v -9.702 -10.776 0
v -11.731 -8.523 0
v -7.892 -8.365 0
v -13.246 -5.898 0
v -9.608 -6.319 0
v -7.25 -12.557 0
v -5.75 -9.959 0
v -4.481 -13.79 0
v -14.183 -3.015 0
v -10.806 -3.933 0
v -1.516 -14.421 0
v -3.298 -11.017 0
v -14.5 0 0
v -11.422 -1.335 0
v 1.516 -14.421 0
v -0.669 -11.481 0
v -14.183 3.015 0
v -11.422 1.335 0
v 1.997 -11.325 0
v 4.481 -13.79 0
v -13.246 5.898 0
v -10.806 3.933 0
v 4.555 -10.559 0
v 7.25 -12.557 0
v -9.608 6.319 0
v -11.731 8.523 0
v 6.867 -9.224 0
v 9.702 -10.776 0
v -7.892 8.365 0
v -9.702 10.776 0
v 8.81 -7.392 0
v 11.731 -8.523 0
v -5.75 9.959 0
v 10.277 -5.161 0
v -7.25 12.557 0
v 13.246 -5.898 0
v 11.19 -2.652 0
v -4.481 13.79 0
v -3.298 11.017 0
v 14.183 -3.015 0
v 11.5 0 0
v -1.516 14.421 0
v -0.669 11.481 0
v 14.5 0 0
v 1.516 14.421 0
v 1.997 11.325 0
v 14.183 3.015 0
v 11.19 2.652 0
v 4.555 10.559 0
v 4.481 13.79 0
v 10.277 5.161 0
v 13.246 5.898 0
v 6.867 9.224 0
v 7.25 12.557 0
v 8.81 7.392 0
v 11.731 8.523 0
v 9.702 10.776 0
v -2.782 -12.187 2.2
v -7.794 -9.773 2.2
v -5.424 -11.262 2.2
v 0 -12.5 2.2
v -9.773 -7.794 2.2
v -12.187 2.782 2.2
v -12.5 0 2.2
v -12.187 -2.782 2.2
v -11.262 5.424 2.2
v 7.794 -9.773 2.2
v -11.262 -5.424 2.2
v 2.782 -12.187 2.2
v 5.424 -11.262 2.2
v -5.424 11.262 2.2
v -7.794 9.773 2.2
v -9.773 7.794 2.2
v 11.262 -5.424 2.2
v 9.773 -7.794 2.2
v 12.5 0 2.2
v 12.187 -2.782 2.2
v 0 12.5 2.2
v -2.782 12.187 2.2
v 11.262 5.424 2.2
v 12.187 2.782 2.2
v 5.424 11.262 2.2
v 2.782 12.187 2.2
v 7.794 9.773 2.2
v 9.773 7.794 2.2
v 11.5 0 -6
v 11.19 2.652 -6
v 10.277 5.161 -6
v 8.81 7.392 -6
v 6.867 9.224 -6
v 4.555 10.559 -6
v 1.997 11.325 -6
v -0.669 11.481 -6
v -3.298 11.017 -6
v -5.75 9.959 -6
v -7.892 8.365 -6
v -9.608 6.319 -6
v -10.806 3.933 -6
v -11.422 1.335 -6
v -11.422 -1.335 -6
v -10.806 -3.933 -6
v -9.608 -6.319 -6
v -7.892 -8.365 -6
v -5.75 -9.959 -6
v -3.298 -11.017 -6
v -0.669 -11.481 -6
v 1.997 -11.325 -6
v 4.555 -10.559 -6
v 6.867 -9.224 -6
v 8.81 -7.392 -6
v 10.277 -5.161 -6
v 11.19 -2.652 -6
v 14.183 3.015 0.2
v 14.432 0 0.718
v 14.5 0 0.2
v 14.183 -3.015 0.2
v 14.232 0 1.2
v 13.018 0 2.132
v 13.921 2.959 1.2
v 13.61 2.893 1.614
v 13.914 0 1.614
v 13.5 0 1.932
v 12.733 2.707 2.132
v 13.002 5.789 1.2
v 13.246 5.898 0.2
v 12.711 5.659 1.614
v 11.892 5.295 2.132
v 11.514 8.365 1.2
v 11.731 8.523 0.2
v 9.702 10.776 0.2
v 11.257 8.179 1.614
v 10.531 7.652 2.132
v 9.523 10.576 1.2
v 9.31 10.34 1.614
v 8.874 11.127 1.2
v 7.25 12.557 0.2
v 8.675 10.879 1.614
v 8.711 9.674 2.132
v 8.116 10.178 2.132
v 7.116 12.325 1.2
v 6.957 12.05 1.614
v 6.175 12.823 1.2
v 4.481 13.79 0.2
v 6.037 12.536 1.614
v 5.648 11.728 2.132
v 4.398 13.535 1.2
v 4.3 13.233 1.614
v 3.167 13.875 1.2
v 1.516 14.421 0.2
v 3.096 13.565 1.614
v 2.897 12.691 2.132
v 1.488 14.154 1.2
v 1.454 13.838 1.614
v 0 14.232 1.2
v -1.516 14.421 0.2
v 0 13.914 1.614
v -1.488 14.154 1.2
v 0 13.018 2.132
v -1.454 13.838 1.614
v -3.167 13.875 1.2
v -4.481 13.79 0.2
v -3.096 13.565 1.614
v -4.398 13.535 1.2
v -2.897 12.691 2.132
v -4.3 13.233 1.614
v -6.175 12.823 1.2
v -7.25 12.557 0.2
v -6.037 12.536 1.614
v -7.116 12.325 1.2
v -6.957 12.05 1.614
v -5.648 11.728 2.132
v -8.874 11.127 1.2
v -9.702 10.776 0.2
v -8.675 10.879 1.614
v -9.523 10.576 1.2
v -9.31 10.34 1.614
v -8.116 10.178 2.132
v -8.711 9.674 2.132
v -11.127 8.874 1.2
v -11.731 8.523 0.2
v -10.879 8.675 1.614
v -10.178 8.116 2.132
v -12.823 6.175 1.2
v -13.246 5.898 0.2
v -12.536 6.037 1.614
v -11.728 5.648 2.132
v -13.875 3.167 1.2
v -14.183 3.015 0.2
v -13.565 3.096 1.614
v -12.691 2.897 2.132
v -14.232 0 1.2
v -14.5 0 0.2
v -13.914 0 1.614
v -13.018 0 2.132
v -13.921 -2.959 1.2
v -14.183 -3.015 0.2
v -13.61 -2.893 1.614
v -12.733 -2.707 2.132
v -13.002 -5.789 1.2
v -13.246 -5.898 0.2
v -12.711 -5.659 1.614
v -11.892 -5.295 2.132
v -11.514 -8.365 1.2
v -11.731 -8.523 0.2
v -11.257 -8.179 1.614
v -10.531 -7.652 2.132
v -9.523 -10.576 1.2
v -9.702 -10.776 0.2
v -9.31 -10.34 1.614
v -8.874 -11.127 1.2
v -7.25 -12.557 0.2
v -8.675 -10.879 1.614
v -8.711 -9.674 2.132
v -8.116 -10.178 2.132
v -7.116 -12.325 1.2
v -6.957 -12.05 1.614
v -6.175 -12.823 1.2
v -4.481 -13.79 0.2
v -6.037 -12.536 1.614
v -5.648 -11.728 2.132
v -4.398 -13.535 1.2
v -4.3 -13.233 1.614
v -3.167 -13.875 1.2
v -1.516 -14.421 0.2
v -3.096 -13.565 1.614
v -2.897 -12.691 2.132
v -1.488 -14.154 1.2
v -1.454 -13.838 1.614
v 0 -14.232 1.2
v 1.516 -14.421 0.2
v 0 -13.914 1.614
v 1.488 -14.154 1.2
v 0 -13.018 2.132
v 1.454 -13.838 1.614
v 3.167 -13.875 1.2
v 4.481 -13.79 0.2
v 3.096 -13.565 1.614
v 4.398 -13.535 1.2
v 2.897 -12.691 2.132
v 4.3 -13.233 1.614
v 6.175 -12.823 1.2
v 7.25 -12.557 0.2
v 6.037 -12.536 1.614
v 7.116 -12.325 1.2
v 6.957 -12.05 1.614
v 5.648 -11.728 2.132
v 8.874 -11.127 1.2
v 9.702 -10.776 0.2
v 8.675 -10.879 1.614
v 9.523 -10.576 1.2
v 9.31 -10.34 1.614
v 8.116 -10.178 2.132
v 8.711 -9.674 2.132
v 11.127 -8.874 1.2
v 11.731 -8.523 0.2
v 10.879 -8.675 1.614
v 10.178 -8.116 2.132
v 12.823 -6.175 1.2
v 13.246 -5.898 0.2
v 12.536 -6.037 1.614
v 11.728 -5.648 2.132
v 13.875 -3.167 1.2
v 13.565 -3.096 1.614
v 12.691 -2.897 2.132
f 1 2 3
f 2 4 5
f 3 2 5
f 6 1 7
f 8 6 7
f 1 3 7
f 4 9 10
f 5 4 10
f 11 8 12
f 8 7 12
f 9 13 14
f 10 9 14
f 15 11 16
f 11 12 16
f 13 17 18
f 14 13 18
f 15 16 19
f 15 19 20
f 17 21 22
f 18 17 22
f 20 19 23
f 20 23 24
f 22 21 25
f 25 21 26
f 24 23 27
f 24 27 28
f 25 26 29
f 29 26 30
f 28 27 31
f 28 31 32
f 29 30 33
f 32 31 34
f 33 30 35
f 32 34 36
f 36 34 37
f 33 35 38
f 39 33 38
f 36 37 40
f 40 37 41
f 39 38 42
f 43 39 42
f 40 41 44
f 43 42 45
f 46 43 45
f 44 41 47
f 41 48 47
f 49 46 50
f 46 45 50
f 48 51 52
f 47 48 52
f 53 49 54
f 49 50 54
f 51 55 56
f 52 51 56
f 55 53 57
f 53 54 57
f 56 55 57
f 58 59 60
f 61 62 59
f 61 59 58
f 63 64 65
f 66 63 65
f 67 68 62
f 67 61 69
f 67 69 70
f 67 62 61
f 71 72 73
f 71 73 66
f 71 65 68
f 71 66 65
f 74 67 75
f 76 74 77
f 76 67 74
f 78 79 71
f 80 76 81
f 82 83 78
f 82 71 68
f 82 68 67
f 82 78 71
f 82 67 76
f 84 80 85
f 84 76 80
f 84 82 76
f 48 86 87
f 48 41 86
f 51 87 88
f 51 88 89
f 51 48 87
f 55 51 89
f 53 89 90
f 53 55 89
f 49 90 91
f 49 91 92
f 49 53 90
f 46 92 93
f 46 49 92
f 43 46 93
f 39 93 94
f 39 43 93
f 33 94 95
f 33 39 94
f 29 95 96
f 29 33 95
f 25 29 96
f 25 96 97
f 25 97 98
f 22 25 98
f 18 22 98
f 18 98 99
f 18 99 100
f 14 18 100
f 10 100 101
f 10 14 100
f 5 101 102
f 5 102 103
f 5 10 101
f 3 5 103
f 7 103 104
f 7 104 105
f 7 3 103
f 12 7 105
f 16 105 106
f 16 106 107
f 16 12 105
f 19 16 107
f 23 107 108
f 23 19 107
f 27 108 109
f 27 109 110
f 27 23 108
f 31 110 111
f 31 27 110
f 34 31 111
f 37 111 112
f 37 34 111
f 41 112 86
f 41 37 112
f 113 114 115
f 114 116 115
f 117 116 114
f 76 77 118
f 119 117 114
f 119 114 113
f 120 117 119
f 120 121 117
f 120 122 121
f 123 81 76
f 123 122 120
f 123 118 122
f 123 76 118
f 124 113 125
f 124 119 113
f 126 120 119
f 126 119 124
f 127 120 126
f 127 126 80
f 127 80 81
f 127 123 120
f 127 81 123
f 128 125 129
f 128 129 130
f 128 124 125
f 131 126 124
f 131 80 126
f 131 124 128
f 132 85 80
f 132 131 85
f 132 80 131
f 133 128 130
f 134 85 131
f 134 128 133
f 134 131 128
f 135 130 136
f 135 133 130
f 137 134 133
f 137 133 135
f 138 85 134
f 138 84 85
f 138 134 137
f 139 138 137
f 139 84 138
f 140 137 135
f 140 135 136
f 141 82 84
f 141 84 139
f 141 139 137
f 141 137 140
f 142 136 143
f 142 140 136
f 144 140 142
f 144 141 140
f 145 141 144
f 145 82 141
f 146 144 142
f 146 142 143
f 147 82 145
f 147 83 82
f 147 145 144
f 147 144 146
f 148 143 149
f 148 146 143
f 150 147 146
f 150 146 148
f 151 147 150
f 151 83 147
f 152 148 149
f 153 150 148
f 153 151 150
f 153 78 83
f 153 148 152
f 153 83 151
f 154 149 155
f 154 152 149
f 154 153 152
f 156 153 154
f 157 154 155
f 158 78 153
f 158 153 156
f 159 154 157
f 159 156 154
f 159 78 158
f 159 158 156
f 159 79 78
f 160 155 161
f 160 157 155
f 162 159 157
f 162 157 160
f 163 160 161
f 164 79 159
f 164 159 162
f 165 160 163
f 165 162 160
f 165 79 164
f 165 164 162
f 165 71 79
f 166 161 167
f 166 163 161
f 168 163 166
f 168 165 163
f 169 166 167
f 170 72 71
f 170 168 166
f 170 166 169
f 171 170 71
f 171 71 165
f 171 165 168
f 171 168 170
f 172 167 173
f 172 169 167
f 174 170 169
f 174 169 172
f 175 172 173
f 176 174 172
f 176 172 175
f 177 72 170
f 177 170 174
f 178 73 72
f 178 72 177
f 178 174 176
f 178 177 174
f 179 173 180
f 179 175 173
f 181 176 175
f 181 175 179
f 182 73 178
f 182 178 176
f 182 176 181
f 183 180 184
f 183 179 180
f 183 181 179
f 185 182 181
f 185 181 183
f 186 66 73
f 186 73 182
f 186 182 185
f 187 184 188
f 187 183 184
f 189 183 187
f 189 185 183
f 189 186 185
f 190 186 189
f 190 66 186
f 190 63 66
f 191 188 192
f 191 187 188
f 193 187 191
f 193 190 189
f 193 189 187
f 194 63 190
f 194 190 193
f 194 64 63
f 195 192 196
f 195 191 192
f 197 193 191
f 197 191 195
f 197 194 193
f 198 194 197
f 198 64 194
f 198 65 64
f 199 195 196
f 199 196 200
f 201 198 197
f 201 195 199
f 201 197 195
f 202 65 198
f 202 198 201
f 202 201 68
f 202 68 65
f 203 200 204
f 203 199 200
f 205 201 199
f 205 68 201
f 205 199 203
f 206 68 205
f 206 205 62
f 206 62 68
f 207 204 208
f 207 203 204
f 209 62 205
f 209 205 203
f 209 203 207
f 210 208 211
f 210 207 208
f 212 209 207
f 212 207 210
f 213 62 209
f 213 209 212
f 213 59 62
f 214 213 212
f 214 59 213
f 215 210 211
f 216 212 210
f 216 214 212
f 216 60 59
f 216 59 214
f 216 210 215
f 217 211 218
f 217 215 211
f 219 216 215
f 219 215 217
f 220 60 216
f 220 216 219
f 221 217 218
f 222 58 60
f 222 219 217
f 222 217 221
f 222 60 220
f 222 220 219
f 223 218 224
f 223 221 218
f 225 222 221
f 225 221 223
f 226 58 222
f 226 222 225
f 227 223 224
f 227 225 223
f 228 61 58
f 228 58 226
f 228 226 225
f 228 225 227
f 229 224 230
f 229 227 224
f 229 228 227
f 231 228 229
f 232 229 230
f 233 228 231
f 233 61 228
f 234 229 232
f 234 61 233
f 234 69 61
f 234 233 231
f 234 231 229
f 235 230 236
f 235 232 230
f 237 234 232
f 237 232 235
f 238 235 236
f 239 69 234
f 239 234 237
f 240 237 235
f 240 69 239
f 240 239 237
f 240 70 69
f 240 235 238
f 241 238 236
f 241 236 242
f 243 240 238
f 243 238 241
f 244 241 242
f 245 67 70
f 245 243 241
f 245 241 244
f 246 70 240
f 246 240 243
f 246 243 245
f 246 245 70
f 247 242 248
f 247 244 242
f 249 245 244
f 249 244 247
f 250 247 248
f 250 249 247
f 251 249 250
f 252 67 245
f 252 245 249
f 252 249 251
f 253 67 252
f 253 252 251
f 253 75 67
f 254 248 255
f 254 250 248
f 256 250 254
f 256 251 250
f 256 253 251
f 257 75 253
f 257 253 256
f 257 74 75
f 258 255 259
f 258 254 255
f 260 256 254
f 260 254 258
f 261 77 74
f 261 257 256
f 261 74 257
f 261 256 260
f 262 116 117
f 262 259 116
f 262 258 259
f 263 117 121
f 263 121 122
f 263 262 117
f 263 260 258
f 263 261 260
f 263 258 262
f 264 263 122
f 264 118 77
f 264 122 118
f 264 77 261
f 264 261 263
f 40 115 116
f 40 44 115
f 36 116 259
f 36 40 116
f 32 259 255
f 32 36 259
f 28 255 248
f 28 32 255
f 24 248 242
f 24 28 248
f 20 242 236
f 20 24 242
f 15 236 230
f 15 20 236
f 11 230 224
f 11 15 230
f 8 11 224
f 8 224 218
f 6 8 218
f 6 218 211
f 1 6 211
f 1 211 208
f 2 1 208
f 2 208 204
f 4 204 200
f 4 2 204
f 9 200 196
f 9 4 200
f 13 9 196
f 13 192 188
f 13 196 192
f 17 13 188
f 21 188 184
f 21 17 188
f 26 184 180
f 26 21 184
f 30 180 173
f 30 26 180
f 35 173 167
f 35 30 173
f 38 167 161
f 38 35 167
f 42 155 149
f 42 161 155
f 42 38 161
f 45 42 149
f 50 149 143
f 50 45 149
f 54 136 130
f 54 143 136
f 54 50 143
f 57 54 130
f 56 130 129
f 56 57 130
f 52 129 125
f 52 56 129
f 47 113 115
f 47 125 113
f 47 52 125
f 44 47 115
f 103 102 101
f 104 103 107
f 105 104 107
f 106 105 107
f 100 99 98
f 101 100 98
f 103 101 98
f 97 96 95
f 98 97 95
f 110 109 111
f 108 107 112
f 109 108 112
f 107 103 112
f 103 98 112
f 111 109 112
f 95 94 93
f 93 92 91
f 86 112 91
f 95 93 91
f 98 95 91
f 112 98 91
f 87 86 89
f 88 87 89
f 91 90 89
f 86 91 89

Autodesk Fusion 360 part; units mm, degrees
sketch "Sketch1" plane through (0, 0, 0) normal (0, 0, 1) x (1, 0, 0)
  circle A0 centre (0, 0) radius 11.5
  circle A1 centre (0, 0) radius 14.5
  dimension "d1" = 23
  dimension "d2" = 29
extrude "Extrude1" add sketch "Sketch1" along normal blind 2.2 contours A0 | A1
extrude "Extrude2" add sketch "Sketch1" against normal blind 6 contours A0
fillet "Fillet1" radius 2 1 edges at (-13.5187, -5.2434, 2.2)
